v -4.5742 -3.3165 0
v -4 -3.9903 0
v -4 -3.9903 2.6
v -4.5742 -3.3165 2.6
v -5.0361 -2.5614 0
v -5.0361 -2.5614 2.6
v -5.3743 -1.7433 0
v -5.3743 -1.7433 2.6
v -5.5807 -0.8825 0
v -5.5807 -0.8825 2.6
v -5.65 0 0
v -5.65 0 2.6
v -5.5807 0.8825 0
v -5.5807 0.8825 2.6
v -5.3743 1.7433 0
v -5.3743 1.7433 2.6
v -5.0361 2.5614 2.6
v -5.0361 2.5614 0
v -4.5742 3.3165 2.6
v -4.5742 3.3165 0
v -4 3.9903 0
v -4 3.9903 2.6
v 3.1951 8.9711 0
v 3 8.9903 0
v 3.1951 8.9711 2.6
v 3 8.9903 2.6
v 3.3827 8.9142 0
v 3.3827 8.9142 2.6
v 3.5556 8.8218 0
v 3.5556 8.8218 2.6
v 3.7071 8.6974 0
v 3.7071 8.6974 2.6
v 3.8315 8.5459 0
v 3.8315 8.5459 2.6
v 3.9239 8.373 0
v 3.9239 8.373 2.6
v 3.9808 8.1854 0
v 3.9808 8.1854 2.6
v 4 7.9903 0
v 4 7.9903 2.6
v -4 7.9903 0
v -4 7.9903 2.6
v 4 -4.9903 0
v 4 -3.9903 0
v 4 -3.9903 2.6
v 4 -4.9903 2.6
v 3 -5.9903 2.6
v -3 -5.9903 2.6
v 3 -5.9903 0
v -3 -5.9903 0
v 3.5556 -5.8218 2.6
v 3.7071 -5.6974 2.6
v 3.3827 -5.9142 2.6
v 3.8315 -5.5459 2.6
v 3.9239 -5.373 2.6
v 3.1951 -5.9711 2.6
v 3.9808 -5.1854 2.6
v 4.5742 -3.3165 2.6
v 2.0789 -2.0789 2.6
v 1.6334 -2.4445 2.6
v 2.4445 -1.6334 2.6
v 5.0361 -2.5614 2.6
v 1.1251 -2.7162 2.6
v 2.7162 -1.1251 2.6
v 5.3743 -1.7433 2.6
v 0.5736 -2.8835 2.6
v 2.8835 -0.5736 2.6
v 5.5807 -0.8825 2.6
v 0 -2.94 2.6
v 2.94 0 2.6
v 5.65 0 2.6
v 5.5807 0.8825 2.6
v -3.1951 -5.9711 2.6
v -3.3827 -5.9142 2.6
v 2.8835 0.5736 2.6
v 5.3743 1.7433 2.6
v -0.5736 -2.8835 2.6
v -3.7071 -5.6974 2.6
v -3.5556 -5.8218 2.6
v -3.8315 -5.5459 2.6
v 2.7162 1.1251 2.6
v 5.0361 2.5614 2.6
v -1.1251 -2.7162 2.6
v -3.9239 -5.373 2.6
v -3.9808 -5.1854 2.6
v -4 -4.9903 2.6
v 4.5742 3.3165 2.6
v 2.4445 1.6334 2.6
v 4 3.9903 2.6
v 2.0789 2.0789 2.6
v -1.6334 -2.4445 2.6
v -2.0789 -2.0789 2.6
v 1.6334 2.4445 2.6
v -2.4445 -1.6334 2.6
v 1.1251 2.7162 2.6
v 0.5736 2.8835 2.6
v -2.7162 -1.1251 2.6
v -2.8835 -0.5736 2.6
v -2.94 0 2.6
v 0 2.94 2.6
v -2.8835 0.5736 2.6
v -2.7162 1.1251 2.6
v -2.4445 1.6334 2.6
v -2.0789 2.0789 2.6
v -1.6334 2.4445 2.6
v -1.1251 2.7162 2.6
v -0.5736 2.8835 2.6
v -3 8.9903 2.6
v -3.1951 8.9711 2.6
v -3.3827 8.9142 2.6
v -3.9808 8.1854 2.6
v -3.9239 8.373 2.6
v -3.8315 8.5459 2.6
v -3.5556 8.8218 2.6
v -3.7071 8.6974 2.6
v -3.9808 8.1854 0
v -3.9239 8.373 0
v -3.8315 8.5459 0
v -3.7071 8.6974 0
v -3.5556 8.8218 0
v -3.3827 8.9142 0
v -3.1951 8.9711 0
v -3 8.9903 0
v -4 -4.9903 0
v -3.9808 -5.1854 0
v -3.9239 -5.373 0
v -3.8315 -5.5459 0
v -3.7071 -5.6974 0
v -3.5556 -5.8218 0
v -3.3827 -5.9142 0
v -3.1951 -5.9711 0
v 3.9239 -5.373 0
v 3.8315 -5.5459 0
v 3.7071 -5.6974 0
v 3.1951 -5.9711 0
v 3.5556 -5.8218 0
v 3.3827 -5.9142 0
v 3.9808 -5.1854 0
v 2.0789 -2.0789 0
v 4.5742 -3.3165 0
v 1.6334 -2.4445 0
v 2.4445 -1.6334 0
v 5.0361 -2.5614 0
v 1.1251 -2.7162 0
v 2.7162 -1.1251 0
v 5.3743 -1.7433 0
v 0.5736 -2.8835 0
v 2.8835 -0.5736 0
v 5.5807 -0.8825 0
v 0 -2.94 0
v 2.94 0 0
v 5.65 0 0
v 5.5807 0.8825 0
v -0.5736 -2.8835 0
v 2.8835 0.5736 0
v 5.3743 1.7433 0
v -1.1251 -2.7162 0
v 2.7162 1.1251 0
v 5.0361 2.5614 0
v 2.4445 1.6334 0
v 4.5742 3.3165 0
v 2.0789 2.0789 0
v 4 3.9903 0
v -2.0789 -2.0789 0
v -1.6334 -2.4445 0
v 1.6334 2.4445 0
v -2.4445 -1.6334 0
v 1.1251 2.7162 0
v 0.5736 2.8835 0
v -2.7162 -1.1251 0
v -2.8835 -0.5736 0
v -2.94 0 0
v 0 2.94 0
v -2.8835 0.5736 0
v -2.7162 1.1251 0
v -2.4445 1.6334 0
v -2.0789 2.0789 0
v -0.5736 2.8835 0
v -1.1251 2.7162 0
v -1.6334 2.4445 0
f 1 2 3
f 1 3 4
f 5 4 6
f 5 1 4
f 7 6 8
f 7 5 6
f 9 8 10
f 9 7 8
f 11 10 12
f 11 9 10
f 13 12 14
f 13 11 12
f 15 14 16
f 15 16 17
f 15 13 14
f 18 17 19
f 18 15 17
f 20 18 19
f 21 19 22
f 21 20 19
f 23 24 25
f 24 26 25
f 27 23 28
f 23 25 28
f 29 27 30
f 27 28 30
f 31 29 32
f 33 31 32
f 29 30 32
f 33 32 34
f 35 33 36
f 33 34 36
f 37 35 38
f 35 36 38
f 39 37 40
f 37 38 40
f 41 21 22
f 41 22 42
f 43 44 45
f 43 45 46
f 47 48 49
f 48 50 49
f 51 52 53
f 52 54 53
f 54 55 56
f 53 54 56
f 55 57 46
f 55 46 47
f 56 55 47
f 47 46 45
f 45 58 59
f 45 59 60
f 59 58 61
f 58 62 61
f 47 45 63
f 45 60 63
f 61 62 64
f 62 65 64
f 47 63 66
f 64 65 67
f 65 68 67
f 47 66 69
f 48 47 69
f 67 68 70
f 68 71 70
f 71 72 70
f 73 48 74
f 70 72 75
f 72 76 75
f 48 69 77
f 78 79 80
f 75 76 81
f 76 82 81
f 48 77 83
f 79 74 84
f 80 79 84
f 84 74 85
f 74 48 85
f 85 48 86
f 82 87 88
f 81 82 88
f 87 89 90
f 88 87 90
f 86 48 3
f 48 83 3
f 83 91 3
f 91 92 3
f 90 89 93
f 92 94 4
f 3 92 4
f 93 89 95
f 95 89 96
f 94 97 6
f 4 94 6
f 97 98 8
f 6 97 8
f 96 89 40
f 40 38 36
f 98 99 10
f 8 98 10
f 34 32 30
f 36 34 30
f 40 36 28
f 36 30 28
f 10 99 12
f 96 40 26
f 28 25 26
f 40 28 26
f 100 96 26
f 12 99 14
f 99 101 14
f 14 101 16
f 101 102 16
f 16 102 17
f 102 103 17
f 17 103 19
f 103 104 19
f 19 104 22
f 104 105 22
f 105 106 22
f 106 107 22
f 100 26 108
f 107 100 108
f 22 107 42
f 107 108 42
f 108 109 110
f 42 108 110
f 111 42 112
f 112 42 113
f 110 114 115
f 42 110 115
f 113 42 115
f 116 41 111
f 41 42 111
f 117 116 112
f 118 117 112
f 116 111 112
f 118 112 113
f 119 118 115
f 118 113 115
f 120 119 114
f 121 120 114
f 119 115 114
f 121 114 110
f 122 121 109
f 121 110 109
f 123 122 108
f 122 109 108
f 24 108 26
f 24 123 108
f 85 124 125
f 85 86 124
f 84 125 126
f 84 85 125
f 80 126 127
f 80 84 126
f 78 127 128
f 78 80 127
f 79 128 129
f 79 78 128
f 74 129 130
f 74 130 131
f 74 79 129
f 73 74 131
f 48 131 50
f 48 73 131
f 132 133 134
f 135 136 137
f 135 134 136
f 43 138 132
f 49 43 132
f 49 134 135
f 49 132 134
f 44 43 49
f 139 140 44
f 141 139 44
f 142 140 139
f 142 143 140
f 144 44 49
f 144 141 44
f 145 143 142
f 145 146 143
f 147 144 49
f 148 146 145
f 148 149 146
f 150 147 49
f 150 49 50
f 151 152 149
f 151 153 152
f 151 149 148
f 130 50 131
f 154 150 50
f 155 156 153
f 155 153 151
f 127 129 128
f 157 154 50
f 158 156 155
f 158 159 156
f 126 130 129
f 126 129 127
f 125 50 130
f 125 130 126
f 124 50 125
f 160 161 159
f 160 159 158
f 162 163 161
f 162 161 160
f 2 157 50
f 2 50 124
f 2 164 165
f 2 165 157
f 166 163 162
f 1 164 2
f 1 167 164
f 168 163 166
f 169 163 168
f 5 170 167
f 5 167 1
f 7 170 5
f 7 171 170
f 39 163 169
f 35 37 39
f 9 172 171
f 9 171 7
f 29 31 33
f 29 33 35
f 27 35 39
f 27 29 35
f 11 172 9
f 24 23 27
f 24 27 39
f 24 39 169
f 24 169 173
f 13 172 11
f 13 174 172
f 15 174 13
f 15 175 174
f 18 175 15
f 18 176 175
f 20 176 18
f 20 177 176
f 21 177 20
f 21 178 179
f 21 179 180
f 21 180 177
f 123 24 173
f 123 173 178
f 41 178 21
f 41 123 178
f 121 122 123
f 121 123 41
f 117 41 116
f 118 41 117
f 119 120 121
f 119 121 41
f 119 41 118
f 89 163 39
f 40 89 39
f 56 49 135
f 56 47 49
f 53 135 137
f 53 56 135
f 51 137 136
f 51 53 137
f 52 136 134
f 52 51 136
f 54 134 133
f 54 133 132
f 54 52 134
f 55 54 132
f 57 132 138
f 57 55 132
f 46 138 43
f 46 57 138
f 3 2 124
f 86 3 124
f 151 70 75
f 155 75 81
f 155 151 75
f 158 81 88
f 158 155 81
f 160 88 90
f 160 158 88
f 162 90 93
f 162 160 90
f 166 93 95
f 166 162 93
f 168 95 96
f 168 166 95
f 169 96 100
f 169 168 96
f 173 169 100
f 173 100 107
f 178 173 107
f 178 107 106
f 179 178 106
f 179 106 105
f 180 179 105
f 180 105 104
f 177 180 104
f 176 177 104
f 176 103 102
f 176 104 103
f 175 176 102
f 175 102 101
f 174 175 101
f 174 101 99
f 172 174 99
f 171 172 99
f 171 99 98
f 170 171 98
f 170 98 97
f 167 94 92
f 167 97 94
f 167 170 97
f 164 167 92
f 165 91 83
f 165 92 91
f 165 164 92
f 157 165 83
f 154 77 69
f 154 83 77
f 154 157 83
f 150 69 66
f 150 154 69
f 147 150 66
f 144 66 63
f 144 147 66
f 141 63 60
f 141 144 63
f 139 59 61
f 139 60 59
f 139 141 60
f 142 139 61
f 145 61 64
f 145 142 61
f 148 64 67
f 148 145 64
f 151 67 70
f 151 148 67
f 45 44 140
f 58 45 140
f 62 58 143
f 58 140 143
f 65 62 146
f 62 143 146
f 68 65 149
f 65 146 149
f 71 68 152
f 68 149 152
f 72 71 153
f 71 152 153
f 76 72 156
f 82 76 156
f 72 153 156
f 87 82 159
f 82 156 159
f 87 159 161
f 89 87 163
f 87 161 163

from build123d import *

# Parameters (mm, degrees)
PAD_DEPTH    = 2.6
SKETCH001_R  = 2.94
POCKET_DEPTH = 2.601
FILLET_R     = 1


with BuildPart() as part:
    # Sketch (on XY_Plane of Origin) → Pad (new body)
    with BuildSketch(Plane.XY):
        with BuildLine():
            ThreePointArc((4, -3.990301), (5.65, 0), (4, 3.990301))
            Line((4, 3.990301), (4, 8.990301))
            Line((4, 8.990301), (0, 8.990301))
            Line((0, 8.990301), (0, -5.990301))
            Line((4, -5.990301), (0, -5.990301))
            Line((4, -3.990301), (4, -5.990301))
        make_face()
    pad = extrude(amount=PAD_DEPTH)

    # Mirrored: Pad across Sketch V_Axis
    add(pad.mirror(Plane(origin=(0, 0, 0), x_dir=(0, 0, 1), z_dir=(1, 0, 0))))

    # Sketch001 (on XY_Plane of Origin) → Pocket (cut, through all)
    with BuildSketch(Plane.XY):
        Circle(SKETCH001_R)
    extrude(amount=POCKET_DEPTH, mode=Mode.SUBTRACT)

    # Fillet
    fillet_edges = [part.edges().sort_by_distance(p)[0] for p in [
        (-4, 8.990301, 1.3),
        (-4, -5.990301, 1.3),
        (4, -5.990301, 1.3),
        (4, 8.990301, 1.3),
    ]]
    fillet(fillet_edges, radius=FILLET_R)


solid = part.part
